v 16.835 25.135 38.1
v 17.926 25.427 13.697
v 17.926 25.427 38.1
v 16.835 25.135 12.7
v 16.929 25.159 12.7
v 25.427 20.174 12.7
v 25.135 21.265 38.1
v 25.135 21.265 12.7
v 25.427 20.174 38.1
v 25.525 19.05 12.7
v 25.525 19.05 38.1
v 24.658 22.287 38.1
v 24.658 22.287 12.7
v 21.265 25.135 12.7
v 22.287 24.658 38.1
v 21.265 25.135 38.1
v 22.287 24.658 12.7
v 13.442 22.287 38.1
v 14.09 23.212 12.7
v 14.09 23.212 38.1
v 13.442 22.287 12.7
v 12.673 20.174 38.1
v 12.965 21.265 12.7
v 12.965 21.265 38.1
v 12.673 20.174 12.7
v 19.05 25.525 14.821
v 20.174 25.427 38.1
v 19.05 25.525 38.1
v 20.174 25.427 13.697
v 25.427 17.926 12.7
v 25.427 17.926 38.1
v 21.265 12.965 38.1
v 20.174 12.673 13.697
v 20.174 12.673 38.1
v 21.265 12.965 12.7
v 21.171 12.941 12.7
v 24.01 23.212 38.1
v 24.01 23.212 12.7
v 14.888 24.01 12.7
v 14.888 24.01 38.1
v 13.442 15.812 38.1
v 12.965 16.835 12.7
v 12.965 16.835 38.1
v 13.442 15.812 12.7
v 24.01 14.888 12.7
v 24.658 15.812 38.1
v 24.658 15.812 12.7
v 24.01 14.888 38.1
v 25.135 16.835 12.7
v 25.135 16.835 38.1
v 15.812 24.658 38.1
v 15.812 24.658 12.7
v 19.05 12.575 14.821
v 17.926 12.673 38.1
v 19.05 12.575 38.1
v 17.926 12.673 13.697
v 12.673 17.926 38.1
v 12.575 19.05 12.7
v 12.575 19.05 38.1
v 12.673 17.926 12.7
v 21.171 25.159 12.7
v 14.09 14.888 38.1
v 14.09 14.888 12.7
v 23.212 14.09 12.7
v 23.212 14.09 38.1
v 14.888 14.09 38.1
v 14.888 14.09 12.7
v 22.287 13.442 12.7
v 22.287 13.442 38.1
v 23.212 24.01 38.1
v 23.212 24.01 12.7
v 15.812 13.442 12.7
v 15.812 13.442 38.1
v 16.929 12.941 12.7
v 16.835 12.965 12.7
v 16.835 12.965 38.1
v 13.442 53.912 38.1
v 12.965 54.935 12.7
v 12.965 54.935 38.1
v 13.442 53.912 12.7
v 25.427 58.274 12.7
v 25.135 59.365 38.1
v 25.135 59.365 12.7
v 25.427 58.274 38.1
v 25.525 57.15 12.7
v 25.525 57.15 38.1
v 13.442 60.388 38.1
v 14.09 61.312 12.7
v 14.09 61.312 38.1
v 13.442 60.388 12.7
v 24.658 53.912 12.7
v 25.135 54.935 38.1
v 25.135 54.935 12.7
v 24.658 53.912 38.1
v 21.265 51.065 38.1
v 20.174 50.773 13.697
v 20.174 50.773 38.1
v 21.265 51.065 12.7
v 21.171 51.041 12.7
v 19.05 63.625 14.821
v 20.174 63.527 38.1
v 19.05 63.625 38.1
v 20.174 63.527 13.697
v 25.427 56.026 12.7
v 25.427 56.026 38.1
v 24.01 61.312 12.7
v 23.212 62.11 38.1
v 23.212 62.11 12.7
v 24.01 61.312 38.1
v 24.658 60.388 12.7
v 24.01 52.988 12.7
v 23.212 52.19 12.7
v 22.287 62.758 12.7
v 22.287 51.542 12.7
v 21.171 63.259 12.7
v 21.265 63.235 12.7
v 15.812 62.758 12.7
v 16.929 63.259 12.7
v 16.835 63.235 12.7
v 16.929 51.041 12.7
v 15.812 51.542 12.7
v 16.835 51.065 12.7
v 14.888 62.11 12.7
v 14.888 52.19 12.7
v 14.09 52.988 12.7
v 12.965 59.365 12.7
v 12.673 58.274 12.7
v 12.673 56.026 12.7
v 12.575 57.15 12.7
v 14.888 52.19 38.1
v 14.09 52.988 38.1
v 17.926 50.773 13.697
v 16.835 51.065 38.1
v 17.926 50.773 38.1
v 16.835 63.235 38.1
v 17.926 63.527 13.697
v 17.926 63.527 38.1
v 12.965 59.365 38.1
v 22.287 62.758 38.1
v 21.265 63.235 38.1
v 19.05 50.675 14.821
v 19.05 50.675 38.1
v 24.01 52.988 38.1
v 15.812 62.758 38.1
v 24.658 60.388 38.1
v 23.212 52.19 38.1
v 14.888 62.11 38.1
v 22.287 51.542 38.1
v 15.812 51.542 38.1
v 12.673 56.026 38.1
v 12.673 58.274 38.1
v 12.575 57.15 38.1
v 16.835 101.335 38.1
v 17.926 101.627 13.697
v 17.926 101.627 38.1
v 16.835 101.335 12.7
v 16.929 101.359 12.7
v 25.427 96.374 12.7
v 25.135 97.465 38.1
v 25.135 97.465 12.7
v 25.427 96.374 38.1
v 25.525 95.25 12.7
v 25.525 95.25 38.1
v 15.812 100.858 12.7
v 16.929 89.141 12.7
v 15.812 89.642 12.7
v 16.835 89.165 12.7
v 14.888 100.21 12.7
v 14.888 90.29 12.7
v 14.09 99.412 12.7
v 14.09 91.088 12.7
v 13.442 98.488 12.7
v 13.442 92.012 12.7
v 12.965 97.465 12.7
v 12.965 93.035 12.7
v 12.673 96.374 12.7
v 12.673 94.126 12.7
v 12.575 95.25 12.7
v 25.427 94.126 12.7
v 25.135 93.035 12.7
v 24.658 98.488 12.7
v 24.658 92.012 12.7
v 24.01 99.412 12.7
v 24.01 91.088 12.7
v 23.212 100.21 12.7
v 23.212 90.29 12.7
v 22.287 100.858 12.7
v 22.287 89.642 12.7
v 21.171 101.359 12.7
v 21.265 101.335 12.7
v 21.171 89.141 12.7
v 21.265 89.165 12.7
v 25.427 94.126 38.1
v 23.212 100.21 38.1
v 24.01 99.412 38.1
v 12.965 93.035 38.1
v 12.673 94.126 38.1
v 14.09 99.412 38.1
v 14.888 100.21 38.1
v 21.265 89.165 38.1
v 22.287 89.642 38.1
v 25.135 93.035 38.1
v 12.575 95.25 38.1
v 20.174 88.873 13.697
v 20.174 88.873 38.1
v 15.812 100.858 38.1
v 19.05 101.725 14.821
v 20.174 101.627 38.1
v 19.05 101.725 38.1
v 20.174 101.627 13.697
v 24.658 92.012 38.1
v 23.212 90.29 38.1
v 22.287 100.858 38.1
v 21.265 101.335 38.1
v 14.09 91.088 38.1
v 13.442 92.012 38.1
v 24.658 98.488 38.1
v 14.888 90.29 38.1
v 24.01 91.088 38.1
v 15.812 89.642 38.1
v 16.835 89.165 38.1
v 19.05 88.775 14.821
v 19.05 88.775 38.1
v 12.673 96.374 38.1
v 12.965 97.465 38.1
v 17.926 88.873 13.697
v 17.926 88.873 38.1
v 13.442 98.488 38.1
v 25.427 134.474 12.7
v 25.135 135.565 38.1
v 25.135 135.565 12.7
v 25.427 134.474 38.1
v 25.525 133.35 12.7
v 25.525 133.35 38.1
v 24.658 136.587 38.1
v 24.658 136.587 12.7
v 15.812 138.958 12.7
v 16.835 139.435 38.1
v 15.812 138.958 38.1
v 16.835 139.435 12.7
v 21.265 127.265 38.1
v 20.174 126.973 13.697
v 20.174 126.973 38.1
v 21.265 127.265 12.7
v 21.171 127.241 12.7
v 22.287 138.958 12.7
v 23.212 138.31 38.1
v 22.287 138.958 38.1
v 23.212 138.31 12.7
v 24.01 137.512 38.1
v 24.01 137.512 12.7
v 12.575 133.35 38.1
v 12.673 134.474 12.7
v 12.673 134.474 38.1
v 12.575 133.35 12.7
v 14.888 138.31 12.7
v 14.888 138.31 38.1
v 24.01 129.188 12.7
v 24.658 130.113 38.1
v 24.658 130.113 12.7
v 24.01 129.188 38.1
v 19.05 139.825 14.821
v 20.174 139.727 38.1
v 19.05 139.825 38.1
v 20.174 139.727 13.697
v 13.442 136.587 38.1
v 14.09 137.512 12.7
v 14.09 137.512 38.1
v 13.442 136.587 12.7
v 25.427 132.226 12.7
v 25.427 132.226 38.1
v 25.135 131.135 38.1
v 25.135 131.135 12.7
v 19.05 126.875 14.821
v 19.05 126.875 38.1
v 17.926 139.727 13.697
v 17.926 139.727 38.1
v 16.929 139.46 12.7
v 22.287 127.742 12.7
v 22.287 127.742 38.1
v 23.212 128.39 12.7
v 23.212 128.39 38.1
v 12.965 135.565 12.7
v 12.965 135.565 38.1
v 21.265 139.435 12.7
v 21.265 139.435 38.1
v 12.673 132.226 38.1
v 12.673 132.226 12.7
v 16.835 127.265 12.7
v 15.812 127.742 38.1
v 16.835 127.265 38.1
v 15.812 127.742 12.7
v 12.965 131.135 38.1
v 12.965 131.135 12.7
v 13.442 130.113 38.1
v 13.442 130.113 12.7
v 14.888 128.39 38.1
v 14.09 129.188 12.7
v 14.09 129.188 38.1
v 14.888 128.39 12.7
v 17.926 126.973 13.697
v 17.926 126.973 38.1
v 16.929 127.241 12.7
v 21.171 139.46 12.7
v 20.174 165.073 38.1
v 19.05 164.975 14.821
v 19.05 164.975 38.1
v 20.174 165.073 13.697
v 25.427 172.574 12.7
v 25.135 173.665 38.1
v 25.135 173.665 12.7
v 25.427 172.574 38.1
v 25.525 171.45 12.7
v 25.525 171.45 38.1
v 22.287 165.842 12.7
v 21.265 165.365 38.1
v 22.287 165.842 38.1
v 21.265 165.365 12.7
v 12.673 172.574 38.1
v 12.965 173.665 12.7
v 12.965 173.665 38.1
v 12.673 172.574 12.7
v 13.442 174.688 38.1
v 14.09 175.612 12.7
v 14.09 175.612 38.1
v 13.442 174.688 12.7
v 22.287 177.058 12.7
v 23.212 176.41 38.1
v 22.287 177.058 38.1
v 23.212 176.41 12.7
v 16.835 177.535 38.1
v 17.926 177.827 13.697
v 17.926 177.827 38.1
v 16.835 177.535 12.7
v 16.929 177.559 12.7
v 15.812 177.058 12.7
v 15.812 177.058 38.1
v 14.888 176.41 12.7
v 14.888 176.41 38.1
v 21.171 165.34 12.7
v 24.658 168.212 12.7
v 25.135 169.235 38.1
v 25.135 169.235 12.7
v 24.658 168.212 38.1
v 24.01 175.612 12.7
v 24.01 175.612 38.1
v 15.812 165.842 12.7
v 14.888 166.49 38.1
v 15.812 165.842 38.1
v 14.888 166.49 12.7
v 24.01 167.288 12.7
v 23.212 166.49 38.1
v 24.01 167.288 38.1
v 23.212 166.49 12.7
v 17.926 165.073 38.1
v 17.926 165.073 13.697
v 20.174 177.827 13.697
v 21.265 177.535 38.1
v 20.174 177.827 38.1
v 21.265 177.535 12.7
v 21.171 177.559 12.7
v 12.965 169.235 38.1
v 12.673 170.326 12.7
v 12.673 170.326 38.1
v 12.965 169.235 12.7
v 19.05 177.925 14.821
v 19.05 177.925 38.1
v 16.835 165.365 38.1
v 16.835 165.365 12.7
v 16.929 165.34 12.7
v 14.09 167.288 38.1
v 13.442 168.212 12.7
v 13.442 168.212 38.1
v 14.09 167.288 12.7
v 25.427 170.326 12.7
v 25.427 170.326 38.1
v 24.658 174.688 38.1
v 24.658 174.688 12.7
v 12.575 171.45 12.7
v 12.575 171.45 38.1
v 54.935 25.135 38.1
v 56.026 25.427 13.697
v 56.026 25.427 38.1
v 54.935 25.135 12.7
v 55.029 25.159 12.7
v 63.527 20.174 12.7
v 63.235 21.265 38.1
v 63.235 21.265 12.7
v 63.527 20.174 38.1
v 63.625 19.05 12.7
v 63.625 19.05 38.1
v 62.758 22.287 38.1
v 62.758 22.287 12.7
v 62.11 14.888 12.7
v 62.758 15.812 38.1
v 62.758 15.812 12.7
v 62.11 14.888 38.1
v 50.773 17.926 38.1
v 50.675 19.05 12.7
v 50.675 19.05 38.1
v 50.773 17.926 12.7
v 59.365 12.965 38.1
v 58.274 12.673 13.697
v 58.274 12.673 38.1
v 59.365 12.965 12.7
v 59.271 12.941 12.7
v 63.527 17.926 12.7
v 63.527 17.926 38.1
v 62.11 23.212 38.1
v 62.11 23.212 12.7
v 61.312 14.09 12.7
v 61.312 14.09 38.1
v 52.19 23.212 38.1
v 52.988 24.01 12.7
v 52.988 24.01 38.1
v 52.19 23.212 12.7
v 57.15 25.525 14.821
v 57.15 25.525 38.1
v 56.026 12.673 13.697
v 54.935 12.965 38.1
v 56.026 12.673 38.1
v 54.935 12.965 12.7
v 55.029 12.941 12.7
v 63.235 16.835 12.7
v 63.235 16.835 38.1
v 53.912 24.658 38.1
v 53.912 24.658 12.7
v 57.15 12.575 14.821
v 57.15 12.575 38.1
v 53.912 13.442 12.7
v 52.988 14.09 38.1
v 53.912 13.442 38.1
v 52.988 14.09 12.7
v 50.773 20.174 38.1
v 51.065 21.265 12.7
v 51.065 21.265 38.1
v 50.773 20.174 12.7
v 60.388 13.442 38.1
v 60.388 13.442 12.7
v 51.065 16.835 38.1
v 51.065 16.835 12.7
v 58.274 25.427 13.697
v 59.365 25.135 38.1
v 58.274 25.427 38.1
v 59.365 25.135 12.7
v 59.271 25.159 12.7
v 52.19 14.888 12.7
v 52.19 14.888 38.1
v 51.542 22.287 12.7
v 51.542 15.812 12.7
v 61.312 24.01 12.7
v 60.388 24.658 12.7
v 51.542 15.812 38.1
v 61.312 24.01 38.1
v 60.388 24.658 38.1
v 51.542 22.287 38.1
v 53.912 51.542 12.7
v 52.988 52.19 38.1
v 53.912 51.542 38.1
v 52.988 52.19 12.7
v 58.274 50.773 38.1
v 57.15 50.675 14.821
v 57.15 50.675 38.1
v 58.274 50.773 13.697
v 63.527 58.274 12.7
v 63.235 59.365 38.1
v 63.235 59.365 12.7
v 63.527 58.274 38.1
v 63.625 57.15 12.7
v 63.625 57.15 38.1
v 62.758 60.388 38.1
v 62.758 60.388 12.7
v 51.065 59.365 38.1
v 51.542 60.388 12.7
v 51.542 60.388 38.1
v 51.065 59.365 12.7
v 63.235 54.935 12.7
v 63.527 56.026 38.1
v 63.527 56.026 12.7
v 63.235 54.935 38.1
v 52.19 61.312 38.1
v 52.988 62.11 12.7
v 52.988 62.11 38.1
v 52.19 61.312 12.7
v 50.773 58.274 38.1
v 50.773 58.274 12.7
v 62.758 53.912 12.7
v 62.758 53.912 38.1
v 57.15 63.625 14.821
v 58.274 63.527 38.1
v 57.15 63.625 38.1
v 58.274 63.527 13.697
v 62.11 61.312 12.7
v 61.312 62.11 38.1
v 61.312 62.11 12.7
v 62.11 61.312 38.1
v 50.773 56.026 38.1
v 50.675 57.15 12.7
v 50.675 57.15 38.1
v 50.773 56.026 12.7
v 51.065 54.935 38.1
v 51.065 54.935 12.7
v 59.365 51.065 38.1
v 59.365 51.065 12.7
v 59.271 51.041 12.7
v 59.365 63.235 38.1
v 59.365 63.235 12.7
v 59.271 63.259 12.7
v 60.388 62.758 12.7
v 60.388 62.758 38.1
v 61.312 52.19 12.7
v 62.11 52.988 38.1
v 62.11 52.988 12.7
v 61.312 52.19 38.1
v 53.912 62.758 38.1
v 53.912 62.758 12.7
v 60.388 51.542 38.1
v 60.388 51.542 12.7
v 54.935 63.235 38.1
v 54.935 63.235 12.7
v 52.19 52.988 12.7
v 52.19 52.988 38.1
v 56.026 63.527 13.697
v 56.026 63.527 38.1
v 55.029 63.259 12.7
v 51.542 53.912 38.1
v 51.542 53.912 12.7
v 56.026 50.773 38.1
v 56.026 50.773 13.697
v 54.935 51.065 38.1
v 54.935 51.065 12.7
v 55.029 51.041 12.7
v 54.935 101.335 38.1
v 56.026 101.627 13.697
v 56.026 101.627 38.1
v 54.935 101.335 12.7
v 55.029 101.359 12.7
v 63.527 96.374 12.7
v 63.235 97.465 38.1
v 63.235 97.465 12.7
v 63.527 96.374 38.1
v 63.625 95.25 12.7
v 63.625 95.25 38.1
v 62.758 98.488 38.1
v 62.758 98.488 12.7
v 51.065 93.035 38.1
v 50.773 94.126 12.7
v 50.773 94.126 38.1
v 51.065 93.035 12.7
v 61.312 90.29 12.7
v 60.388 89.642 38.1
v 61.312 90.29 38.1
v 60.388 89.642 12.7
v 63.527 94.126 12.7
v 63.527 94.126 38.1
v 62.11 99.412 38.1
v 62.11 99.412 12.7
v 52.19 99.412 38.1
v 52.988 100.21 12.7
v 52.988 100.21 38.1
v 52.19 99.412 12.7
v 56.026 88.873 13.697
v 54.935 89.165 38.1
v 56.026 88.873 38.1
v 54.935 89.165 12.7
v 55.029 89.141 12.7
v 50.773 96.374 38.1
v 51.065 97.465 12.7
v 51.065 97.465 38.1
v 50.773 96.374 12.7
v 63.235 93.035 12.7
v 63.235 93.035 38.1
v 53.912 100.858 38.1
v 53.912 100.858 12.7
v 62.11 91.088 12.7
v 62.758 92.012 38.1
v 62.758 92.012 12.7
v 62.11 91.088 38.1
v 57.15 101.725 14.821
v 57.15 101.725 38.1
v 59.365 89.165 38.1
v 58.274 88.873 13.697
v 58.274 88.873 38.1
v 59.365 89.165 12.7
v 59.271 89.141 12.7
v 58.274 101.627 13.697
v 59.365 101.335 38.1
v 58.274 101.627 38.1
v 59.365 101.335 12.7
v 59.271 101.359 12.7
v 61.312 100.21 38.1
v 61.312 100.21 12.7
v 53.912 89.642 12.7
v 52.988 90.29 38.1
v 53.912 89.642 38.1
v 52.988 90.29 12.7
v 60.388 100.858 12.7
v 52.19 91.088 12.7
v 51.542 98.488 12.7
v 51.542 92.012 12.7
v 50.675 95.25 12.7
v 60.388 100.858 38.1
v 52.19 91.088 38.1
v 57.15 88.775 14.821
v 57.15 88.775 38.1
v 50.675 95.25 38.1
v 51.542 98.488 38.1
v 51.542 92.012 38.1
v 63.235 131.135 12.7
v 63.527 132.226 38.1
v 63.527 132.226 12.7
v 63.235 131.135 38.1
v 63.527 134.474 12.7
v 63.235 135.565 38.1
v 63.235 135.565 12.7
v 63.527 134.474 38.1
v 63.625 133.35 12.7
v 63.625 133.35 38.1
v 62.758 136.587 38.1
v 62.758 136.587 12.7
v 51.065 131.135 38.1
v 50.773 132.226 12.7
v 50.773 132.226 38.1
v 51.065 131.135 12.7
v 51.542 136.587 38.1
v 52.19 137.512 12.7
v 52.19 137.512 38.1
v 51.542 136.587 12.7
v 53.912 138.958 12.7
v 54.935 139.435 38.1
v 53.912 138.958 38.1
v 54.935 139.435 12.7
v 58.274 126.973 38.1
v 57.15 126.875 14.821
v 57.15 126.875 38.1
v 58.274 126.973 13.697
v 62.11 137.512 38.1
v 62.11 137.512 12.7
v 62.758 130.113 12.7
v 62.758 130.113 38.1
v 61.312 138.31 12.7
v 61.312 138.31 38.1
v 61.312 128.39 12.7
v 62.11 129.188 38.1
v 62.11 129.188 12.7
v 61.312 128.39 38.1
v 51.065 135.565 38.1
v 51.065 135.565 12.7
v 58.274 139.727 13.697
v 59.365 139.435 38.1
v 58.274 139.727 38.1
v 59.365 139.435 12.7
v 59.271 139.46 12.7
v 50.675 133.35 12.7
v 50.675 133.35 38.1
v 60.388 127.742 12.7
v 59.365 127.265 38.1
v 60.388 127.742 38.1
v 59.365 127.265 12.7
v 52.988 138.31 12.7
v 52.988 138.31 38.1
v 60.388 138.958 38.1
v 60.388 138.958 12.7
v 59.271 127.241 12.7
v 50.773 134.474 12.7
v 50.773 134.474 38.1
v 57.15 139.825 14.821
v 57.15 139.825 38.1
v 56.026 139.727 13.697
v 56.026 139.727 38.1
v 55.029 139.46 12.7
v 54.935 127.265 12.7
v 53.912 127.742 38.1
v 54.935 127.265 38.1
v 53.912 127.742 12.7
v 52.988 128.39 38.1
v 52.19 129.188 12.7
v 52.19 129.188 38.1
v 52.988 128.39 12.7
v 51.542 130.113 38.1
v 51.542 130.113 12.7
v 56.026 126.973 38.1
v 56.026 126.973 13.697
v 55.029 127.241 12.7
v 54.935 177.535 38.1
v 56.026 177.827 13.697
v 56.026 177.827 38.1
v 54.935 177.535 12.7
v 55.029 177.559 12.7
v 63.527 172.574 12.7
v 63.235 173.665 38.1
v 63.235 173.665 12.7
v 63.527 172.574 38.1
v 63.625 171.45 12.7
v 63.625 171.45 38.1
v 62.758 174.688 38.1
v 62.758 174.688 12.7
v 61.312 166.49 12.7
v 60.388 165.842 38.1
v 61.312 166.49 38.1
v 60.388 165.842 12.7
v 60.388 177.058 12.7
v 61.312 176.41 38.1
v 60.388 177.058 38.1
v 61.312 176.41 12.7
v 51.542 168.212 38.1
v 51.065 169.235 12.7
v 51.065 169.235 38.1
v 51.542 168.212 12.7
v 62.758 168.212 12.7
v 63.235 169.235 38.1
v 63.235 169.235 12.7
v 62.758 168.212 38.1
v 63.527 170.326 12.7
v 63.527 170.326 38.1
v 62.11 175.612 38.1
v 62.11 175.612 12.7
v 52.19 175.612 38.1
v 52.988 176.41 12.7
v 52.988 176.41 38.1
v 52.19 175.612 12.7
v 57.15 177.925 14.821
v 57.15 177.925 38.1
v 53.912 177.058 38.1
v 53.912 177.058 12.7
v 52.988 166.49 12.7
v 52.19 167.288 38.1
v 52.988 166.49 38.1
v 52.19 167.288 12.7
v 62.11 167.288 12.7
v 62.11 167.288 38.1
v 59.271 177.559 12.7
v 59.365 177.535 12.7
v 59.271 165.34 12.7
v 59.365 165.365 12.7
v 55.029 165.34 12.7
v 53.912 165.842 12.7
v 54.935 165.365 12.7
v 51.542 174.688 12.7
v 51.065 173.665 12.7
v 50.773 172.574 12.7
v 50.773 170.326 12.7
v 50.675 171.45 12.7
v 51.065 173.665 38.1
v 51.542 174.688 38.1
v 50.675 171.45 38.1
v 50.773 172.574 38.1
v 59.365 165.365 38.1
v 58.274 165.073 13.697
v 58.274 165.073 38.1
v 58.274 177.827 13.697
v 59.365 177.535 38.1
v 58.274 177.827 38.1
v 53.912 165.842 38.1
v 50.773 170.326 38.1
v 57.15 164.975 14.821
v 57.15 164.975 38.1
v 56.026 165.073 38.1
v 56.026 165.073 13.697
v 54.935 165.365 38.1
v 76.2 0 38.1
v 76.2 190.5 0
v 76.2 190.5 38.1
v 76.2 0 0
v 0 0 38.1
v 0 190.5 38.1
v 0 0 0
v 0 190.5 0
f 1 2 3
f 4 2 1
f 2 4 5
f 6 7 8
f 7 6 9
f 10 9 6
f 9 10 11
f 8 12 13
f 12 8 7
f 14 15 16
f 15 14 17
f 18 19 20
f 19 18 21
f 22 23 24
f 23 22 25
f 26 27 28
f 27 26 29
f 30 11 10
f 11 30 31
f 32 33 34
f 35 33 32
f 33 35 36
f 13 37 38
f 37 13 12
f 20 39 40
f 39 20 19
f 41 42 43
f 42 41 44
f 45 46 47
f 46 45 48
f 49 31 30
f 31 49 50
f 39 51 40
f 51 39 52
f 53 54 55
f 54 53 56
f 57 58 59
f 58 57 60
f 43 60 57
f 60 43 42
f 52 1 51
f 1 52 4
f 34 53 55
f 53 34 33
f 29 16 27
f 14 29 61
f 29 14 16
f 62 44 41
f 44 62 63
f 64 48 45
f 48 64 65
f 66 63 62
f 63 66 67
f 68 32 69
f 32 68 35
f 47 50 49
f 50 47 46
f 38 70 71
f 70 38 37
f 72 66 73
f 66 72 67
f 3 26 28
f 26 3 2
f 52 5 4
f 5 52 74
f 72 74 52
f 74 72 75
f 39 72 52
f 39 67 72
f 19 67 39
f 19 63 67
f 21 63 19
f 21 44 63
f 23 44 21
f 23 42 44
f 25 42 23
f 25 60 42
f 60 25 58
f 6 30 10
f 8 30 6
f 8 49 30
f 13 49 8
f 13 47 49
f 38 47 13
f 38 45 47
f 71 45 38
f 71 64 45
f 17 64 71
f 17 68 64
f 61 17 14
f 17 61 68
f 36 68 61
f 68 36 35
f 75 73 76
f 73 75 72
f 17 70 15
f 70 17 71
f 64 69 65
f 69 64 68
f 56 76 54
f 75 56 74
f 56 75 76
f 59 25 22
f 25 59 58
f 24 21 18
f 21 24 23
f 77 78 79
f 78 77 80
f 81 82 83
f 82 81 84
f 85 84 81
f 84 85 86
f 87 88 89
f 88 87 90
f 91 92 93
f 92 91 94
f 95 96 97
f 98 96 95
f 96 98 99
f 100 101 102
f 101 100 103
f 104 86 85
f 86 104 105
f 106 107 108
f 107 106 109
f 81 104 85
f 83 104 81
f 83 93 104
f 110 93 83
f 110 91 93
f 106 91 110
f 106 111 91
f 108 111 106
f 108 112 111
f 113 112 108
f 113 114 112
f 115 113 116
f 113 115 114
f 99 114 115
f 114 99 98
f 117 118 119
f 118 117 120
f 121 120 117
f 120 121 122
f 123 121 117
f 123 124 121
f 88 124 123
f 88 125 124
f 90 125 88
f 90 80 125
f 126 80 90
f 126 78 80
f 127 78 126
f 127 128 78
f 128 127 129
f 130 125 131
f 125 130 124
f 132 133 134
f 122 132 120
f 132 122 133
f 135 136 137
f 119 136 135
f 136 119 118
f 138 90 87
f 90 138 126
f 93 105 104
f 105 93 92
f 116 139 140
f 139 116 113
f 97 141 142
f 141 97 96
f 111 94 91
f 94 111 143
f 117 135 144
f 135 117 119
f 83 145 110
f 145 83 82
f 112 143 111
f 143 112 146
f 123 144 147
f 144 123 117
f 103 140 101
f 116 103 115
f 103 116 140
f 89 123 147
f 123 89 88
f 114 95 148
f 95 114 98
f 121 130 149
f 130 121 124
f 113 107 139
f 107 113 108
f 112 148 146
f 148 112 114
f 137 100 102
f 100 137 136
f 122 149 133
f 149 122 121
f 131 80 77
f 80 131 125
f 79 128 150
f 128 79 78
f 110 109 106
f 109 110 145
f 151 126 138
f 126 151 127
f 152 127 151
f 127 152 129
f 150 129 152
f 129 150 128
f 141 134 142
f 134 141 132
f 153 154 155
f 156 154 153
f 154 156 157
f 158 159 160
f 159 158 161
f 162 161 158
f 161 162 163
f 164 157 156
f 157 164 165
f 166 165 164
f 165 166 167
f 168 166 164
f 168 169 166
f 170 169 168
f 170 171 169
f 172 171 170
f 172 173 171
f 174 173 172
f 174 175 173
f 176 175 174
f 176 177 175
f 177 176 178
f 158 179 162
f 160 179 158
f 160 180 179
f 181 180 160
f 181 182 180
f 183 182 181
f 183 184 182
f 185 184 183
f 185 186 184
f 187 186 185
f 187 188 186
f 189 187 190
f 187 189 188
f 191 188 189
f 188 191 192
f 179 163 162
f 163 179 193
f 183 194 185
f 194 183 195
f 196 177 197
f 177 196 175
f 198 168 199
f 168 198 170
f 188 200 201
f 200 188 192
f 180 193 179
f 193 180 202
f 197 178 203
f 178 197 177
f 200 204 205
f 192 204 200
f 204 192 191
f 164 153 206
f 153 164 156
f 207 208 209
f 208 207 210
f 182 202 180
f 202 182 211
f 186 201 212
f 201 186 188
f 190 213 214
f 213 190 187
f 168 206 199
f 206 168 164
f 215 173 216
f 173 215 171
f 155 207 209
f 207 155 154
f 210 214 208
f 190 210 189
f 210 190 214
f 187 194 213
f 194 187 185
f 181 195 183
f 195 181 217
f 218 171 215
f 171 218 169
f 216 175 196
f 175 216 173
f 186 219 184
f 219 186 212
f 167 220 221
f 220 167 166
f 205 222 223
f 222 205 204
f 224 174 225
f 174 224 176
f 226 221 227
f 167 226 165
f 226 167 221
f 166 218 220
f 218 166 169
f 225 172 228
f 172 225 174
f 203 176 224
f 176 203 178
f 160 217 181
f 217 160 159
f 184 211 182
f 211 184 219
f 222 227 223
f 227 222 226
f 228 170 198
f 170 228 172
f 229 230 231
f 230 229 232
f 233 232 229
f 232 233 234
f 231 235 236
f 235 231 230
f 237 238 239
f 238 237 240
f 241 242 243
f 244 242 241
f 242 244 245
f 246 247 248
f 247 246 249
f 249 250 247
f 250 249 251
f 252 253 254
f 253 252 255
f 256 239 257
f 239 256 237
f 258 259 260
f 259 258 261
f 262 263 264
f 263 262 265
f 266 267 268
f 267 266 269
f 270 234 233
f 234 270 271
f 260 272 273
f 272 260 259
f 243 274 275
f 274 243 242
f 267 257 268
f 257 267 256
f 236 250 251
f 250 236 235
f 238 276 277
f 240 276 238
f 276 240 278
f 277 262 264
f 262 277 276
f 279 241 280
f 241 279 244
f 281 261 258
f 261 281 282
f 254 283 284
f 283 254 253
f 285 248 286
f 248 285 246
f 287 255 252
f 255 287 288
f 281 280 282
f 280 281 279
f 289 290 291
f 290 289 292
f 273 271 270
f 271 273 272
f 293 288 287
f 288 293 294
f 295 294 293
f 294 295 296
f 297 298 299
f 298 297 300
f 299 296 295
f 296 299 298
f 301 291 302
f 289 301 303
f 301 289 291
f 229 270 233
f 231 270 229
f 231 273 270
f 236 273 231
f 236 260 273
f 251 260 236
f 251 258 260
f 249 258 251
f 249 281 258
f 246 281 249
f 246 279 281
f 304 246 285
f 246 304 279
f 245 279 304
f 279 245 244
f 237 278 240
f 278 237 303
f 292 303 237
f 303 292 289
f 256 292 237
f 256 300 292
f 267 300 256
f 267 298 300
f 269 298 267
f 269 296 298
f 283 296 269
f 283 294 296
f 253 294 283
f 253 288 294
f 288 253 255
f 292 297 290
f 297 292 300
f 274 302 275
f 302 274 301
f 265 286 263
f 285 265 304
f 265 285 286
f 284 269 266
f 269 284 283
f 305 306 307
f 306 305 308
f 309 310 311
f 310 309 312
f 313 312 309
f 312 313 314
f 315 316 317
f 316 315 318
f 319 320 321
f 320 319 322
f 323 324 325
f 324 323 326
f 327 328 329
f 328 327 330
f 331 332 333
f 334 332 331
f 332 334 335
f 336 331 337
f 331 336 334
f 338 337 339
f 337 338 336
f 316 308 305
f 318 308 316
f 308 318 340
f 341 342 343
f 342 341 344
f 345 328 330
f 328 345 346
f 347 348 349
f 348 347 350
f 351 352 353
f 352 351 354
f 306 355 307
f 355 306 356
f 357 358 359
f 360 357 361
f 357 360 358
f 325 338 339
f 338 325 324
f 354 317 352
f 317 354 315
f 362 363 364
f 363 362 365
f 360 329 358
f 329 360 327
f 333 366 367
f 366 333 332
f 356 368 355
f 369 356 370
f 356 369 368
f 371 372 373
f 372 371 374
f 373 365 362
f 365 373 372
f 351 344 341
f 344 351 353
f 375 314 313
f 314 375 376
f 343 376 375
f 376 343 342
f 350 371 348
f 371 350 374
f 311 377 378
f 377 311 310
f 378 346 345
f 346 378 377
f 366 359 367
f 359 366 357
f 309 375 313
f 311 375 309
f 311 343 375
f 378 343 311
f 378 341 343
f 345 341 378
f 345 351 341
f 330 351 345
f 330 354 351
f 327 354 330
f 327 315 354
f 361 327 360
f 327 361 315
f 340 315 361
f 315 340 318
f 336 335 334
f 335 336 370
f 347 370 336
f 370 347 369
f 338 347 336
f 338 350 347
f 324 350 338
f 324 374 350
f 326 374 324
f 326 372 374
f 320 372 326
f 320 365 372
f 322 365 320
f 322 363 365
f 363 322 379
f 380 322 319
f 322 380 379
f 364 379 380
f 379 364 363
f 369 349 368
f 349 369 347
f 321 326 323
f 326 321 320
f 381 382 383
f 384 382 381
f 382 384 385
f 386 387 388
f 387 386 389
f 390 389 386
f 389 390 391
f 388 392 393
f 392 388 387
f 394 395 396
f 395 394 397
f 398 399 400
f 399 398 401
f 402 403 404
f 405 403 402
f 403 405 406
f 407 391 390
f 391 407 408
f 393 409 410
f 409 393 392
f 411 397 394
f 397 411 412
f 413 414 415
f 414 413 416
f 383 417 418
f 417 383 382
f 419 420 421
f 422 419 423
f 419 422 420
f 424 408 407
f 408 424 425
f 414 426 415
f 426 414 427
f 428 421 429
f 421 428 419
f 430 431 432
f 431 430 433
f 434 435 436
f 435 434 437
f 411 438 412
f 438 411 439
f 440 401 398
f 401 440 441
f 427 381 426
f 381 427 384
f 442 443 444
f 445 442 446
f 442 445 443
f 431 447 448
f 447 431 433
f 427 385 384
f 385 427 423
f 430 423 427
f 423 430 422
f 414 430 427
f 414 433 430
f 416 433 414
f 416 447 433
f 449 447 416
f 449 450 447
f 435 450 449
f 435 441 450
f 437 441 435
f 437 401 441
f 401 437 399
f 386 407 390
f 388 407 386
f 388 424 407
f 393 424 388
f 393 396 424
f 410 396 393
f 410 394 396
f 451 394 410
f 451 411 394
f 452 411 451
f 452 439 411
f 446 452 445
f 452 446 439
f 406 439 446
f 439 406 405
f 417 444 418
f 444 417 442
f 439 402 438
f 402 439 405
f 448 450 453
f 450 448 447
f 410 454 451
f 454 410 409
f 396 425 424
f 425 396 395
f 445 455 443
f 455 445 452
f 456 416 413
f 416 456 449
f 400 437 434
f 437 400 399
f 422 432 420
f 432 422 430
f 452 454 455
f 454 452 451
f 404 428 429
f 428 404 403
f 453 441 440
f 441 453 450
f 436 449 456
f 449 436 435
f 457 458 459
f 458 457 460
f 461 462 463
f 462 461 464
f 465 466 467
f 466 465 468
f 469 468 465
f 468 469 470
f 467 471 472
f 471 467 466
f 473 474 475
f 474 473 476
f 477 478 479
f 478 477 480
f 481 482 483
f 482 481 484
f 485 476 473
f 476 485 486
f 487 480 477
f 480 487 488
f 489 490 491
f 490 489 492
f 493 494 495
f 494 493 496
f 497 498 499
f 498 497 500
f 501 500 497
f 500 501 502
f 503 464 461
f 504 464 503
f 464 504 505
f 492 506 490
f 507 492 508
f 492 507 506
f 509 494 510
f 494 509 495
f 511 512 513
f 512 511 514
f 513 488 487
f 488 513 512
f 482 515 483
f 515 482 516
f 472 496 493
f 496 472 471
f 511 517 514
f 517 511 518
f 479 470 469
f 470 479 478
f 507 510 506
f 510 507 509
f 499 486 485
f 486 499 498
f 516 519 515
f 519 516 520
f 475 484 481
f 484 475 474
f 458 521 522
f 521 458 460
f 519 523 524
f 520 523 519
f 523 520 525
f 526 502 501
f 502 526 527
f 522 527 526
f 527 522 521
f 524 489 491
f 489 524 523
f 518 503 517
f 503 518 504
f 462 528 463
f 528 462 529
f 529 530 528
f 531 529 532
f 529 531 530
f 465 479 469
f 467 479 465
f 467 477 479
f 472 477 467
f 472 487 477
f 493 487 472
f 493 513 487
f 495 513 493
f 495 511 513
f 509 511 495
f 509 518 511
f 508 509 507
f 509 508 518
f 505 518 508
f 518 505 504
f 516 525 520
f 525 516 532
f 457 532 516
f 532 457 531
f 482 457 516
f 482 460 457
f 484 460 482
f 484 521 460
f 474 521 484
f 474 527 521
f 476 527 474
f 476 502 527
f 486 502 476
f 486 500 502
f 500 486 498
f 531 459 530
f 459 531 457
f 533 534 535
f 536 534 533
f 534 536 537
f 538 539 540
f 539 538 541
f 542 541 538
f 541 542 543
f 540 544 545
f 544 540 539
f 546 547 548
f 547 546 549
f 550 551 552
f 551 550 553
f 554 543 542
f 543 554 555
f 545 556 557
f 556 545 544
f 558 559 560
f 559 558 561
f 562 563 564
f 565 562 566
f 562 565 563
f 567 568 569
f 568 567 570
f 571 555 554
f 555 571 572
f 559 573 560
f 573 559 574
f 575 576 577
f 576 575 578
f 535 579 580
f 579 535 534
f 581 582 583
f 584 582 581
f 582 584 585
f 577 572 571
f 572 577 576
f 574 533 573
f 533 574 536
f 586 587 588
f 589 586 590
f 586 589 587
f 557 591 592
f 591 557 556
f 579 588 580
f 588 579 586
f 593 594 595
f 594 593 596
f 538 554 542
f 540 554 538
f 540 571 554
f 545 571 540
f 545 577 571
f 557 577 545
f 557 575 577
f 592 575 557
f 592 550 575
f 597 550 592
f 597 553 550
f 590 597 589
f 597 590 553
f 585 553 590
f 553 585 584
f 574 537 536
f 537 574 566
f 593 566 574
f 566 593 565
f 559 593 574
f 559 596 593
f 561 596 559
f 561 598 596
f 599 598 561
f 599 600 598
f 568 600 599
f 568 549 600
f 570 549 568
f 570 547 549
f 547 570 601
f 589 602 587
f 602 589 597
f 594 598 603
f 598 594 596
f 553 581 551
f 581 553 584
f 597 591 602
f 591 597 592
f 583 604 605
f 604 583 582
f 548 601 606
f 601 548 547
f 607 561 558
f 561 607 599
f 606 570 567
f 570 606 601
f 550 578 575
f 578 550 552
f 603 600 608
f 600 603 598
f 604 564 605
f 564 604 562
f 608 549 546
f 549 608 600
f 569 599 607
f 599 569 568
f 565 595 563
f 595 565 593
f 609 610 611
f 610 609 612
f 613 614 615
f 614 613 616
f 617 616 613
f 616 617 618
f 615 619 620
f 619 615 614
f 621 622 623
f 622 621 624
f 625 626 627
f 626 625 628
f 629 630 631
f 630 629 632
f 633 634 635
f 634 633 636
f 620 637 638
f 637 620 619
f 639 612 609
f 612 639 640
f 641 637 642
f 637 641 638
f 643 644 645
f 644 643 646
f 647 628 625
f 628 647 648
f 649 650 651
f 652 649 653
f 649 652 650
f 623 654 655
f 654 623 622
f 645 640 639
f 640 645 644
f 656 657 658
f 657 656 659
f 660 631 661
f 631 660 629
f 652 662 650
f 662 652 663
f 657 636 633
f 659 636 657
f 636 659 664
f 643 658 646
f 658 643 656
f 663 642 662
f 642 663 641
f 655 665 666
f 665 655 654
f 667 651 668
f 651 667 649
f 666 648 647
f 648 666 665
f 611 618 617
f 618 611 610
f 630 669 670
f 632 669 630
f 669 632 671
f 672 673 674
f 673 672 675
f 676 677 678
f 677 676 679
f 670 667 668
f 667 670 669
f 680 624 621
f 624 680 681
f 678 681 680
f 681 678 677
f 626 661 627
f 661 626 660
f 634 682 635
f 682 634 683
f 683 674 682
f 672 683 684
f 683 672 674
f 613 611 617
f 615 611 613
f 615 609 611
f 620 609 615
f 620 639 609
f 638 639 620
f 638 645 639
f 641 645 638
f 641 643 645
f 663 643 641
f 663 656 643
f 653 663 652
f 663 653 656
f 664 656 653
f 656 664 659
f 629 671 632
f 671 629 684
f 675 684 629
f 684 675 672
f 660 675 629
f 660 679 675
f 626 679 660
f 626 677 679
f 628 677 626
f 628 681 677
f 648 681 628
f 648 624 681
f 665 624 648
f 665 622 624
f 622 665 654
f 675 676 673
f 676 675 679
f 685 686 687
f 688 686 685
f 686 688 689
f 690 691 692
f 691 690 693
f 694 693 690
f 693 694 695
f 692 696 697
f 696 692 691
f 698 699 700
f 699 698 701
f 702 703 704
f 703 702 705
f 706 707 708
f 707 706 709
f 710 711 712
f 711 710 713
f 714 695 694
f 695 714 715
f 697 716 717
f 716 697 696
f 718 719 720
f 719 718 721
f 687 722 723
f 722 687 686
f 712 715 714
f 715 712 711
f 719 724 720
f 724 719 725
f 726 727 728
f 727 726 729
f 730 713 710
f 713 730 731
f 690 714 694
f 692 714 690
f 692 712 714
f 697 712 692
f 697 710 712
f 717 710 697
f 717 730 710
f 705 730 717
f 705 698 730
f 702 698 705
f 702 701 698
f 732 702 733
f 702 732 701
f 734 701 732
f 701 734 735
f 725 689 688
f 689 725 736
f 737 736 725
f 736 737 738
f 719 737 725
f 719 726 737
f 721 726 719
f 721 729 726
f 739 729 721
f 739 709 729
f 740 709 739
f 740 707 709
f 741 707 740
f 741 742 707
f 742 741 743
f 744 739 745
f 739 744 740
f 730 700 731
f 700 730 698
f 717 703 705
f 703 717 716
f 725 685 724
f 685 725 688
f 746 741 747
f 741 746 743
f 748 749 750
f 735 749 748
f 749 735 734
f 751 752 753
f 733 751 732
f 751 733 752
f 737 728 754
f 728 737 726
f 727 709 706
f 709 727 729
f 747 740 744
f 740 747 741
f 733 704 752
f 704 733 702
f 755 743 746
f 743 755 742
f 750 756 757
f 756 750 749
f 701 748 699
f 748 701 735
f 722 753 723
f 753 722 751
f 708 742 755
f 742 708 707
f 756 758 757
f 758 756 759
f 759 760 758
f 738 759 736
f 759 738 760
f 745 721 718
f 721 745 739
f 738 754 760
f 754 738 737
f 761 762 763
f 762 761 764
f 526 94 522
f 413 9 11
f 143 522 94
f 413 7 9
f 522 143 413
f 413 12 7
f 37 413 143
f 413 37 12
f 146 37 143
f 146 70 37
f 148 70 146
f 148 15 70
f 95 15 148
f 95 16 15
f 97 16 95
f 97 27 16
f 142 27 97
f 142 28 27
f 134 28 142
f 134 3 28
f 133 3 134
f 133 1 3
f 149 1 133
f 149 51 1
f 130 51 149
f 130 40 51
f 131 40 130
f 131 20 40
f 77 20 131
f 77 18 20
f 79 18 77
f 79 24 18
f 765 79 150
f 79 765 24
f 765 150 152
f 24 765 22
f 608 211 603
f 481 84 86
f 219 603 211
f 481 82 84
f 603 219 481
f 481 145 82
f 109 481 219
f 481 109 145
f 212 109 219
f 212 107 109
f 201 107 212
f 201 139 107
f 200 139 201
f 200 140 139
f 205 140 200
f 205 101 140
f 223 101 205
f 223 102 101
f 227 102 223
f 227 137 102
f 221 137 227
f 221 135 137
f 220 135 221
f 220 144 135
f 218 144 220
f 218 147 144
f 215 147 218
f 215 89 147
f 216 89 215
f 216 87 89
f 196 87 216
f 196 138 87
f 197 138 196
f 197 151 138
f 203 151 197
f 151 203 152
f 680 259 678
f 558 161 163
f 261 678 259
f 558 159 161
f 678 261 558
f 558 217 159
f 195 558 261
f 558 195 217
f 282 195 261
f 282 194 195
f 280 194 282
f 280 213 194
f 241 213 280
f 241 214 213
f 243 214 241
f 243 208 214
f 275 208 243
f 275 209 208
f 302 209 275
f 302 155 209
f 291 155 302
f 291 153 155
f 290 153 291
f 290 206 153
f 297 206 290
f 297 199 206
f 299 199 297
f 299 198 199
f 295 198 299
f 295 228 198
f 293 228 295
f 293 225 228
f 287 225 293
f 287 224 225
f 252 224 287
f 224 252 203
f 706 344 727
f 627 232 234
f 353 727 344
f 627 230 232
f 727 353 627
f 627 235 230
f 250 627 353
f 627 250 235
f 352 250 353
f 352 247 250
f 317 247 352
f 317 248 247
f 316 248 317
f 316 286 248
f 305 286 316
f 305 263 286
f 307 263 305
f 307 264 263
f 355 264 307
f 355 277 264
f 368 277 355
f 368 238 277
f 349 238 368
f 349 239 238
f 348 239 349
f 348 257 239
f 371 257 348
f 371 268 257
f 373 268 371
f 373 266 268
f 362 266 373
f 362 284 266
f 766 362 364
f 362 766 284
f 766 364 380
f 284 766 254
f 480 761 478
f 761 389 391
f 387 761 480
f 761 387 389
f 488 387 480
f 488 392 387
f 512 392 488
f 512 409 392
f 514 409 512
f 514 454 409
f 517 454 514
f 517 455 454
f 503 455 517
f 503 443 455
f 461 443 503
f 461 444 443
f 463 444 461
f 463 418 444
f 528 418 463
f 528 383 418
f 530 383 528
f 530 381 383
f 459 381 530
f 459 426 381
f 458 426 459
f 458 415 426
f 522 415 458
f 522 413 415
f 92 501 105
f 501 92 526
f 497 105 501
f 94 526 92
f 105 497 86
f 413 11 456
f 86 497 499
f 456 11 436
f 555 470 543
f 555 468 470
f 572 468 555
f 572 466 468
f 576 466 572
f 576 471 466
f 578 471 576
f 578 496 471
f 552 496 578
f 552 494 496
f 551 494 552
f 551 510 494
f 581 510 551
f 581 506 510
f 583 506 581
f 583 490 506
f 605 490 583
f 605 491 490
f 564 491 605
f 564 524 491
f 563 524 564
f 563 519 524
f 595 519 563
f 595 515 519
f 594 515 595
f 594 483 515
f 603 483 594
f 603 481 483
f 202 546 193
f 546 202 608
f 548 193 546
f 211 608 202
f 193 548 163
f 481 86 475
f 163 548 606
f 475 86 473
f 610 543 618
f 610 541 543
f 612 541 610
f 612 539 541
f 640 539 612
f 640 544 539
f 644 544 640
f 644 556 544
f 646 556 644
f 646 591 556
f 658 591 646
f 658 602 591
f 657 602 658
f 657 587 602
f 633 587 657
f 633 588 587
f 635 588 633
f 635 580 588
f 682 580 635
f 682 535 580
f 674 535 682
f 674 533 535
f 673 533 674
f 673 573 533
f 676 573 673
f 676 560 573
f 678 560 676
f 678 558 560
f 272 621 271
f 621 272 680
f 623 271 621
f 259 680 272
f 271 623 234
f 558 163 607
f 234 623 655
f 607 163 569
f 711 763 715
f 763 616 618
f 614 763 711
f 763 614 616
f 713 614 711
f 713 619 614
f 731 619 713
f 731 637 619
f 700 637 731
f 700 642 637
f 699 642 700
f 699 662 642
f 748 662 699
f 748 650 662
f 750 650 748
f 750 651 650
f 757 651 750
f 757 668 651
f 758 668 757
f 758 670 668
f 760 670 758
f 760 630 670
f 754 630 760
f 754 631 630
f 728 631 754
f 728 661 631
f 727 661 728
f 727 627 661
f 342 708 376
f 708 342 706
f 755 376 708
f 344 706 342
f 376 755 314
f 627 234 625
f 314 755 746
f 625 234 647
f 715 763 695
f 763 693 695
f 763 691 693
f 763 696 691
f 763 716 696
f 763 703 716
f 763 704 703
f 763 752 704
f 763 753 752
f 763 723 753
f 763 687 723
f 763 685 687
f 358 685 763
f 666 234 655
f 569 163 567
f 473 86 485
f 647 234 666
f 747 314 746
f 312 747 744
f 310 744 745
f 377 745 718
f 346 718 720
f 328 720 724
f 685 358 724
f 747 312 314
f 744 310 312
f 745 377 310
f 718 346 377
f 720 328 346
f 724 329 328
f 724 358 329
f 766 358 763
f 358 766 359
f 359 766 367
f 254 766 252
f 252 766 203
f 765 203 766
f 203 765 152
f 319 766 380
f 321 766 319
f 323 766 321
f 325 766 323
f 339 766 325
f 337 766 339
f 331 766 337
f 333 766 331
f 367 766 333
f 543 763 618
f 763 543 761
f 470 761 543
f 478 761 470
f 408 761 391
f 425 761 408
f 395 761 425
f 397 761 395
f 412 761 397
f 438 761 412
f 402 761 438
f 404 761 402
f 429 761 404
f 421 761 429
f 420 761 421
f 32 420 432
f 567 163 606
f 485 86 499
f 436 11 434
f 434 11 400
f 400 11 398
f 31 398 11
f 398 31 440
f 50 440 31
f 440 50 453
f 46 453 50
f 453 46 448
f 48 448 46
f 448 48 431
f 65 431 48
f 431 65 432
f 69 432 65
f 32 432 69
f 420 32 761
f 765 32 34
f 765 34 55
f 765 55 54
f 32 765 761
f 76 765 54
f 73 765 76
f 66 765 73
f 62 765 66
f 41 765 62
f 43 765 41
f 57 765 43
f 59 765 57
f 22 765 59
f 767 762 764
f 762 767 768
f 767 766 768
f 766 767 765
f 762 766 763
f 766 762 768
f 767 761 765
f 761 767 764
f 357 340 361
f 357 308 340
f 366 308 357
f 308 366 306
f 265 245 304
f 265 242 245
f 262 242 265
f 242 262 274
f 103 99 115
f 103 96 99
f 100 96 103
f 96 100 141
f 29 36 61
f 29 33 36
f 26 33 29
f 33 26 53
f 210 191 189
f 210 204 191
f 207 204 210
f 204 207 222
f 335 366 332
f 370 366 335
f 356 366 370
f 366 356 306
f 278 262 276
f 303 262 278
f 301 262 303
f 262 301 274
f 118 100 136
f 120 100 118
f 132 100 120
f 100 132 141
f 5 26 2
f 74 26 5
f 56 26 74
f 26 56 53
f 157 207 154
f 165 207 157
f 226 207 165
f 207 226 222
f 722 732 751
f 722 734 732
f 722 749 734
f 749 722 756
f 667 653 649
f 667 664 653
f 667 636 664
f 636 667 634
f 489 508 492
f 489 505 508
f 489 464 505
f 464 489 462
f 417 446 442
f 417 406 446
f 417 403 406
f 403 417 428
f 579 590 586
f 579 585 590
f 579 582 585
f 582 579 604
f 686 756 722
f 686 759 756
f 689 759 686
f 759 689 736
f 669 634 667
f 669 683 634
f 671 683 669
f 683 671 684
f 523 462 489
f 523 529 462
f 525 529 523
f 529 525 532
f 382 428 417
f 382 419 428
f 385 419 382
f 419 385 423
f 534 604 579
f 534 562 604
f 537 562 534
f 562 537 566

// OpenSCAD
//Title: Dop Stick Holder
//Author: Alex English - ProtoParadigm
//Date: 8/5/16
//License: Creative Commons - Share Alike - Attribution

//Notes: This is intnded to hold dop sticks used in lapidary work, and can be configured to use different size dop sticks, have different spacing between them, and different numbers of holes. It may have other applicatoins, particularly tool-holding in other fields.

IN=25.4*1; //multiplication by 1 to prevent customizer from presenting this as a configurable value

//Units to use, inches or mm - Make sure to update all dimensional values if you change this
units = "i"; //["i":Inches, "m":Millimeters]

//Diameter of the Dop sticks or other tools to be used
dop_diameter = 0.5;
dop_d = units=="i" ? dop_diameter*IN : dop_diameter;

//Center-to-center spacing of holes
hole_spacing = 1.5;
spacing = units=="i" ? hole_spacing*IN : hole_spacing;

//Number of rows of holes
rows=2;

//Number of columns of holes
cols=5;

//Height of the entire holder
height=1.5;
h = units=="i" ? height*IN : height;

//Depth of the holes
hole_depth=1;
depth = units=="i" ? hole_depth*IN : hole_depth;

//Turn the index ridge at the bottom of the holes on or off
use_index=1; //[1:On, 0:Off]

//Size of the ridge at the bottom - only used if the index is turned on
index_size=3; //[1:5]

difference()
{
    cube([rows*spacing,cols*spacing,h]);
    for(x=[0:rows-1]) for(y=[0:cols-1]) translate([x*spacing+spacing/2, y*spacing+spacing/2, h-depth]) cylinder(d=dop_d+0.25, h=depth+1, $fa=10, $fs=0.5);
}

if(use_index)
    for(x=[0:rows-1]) translate([spacing/2+spacing*x, 0, h-depth]) rotate([0, 45, 0]) translate([-index_size/2, 0, -index_size/2]) cube([index_size, cols*spacing, index_size]);
